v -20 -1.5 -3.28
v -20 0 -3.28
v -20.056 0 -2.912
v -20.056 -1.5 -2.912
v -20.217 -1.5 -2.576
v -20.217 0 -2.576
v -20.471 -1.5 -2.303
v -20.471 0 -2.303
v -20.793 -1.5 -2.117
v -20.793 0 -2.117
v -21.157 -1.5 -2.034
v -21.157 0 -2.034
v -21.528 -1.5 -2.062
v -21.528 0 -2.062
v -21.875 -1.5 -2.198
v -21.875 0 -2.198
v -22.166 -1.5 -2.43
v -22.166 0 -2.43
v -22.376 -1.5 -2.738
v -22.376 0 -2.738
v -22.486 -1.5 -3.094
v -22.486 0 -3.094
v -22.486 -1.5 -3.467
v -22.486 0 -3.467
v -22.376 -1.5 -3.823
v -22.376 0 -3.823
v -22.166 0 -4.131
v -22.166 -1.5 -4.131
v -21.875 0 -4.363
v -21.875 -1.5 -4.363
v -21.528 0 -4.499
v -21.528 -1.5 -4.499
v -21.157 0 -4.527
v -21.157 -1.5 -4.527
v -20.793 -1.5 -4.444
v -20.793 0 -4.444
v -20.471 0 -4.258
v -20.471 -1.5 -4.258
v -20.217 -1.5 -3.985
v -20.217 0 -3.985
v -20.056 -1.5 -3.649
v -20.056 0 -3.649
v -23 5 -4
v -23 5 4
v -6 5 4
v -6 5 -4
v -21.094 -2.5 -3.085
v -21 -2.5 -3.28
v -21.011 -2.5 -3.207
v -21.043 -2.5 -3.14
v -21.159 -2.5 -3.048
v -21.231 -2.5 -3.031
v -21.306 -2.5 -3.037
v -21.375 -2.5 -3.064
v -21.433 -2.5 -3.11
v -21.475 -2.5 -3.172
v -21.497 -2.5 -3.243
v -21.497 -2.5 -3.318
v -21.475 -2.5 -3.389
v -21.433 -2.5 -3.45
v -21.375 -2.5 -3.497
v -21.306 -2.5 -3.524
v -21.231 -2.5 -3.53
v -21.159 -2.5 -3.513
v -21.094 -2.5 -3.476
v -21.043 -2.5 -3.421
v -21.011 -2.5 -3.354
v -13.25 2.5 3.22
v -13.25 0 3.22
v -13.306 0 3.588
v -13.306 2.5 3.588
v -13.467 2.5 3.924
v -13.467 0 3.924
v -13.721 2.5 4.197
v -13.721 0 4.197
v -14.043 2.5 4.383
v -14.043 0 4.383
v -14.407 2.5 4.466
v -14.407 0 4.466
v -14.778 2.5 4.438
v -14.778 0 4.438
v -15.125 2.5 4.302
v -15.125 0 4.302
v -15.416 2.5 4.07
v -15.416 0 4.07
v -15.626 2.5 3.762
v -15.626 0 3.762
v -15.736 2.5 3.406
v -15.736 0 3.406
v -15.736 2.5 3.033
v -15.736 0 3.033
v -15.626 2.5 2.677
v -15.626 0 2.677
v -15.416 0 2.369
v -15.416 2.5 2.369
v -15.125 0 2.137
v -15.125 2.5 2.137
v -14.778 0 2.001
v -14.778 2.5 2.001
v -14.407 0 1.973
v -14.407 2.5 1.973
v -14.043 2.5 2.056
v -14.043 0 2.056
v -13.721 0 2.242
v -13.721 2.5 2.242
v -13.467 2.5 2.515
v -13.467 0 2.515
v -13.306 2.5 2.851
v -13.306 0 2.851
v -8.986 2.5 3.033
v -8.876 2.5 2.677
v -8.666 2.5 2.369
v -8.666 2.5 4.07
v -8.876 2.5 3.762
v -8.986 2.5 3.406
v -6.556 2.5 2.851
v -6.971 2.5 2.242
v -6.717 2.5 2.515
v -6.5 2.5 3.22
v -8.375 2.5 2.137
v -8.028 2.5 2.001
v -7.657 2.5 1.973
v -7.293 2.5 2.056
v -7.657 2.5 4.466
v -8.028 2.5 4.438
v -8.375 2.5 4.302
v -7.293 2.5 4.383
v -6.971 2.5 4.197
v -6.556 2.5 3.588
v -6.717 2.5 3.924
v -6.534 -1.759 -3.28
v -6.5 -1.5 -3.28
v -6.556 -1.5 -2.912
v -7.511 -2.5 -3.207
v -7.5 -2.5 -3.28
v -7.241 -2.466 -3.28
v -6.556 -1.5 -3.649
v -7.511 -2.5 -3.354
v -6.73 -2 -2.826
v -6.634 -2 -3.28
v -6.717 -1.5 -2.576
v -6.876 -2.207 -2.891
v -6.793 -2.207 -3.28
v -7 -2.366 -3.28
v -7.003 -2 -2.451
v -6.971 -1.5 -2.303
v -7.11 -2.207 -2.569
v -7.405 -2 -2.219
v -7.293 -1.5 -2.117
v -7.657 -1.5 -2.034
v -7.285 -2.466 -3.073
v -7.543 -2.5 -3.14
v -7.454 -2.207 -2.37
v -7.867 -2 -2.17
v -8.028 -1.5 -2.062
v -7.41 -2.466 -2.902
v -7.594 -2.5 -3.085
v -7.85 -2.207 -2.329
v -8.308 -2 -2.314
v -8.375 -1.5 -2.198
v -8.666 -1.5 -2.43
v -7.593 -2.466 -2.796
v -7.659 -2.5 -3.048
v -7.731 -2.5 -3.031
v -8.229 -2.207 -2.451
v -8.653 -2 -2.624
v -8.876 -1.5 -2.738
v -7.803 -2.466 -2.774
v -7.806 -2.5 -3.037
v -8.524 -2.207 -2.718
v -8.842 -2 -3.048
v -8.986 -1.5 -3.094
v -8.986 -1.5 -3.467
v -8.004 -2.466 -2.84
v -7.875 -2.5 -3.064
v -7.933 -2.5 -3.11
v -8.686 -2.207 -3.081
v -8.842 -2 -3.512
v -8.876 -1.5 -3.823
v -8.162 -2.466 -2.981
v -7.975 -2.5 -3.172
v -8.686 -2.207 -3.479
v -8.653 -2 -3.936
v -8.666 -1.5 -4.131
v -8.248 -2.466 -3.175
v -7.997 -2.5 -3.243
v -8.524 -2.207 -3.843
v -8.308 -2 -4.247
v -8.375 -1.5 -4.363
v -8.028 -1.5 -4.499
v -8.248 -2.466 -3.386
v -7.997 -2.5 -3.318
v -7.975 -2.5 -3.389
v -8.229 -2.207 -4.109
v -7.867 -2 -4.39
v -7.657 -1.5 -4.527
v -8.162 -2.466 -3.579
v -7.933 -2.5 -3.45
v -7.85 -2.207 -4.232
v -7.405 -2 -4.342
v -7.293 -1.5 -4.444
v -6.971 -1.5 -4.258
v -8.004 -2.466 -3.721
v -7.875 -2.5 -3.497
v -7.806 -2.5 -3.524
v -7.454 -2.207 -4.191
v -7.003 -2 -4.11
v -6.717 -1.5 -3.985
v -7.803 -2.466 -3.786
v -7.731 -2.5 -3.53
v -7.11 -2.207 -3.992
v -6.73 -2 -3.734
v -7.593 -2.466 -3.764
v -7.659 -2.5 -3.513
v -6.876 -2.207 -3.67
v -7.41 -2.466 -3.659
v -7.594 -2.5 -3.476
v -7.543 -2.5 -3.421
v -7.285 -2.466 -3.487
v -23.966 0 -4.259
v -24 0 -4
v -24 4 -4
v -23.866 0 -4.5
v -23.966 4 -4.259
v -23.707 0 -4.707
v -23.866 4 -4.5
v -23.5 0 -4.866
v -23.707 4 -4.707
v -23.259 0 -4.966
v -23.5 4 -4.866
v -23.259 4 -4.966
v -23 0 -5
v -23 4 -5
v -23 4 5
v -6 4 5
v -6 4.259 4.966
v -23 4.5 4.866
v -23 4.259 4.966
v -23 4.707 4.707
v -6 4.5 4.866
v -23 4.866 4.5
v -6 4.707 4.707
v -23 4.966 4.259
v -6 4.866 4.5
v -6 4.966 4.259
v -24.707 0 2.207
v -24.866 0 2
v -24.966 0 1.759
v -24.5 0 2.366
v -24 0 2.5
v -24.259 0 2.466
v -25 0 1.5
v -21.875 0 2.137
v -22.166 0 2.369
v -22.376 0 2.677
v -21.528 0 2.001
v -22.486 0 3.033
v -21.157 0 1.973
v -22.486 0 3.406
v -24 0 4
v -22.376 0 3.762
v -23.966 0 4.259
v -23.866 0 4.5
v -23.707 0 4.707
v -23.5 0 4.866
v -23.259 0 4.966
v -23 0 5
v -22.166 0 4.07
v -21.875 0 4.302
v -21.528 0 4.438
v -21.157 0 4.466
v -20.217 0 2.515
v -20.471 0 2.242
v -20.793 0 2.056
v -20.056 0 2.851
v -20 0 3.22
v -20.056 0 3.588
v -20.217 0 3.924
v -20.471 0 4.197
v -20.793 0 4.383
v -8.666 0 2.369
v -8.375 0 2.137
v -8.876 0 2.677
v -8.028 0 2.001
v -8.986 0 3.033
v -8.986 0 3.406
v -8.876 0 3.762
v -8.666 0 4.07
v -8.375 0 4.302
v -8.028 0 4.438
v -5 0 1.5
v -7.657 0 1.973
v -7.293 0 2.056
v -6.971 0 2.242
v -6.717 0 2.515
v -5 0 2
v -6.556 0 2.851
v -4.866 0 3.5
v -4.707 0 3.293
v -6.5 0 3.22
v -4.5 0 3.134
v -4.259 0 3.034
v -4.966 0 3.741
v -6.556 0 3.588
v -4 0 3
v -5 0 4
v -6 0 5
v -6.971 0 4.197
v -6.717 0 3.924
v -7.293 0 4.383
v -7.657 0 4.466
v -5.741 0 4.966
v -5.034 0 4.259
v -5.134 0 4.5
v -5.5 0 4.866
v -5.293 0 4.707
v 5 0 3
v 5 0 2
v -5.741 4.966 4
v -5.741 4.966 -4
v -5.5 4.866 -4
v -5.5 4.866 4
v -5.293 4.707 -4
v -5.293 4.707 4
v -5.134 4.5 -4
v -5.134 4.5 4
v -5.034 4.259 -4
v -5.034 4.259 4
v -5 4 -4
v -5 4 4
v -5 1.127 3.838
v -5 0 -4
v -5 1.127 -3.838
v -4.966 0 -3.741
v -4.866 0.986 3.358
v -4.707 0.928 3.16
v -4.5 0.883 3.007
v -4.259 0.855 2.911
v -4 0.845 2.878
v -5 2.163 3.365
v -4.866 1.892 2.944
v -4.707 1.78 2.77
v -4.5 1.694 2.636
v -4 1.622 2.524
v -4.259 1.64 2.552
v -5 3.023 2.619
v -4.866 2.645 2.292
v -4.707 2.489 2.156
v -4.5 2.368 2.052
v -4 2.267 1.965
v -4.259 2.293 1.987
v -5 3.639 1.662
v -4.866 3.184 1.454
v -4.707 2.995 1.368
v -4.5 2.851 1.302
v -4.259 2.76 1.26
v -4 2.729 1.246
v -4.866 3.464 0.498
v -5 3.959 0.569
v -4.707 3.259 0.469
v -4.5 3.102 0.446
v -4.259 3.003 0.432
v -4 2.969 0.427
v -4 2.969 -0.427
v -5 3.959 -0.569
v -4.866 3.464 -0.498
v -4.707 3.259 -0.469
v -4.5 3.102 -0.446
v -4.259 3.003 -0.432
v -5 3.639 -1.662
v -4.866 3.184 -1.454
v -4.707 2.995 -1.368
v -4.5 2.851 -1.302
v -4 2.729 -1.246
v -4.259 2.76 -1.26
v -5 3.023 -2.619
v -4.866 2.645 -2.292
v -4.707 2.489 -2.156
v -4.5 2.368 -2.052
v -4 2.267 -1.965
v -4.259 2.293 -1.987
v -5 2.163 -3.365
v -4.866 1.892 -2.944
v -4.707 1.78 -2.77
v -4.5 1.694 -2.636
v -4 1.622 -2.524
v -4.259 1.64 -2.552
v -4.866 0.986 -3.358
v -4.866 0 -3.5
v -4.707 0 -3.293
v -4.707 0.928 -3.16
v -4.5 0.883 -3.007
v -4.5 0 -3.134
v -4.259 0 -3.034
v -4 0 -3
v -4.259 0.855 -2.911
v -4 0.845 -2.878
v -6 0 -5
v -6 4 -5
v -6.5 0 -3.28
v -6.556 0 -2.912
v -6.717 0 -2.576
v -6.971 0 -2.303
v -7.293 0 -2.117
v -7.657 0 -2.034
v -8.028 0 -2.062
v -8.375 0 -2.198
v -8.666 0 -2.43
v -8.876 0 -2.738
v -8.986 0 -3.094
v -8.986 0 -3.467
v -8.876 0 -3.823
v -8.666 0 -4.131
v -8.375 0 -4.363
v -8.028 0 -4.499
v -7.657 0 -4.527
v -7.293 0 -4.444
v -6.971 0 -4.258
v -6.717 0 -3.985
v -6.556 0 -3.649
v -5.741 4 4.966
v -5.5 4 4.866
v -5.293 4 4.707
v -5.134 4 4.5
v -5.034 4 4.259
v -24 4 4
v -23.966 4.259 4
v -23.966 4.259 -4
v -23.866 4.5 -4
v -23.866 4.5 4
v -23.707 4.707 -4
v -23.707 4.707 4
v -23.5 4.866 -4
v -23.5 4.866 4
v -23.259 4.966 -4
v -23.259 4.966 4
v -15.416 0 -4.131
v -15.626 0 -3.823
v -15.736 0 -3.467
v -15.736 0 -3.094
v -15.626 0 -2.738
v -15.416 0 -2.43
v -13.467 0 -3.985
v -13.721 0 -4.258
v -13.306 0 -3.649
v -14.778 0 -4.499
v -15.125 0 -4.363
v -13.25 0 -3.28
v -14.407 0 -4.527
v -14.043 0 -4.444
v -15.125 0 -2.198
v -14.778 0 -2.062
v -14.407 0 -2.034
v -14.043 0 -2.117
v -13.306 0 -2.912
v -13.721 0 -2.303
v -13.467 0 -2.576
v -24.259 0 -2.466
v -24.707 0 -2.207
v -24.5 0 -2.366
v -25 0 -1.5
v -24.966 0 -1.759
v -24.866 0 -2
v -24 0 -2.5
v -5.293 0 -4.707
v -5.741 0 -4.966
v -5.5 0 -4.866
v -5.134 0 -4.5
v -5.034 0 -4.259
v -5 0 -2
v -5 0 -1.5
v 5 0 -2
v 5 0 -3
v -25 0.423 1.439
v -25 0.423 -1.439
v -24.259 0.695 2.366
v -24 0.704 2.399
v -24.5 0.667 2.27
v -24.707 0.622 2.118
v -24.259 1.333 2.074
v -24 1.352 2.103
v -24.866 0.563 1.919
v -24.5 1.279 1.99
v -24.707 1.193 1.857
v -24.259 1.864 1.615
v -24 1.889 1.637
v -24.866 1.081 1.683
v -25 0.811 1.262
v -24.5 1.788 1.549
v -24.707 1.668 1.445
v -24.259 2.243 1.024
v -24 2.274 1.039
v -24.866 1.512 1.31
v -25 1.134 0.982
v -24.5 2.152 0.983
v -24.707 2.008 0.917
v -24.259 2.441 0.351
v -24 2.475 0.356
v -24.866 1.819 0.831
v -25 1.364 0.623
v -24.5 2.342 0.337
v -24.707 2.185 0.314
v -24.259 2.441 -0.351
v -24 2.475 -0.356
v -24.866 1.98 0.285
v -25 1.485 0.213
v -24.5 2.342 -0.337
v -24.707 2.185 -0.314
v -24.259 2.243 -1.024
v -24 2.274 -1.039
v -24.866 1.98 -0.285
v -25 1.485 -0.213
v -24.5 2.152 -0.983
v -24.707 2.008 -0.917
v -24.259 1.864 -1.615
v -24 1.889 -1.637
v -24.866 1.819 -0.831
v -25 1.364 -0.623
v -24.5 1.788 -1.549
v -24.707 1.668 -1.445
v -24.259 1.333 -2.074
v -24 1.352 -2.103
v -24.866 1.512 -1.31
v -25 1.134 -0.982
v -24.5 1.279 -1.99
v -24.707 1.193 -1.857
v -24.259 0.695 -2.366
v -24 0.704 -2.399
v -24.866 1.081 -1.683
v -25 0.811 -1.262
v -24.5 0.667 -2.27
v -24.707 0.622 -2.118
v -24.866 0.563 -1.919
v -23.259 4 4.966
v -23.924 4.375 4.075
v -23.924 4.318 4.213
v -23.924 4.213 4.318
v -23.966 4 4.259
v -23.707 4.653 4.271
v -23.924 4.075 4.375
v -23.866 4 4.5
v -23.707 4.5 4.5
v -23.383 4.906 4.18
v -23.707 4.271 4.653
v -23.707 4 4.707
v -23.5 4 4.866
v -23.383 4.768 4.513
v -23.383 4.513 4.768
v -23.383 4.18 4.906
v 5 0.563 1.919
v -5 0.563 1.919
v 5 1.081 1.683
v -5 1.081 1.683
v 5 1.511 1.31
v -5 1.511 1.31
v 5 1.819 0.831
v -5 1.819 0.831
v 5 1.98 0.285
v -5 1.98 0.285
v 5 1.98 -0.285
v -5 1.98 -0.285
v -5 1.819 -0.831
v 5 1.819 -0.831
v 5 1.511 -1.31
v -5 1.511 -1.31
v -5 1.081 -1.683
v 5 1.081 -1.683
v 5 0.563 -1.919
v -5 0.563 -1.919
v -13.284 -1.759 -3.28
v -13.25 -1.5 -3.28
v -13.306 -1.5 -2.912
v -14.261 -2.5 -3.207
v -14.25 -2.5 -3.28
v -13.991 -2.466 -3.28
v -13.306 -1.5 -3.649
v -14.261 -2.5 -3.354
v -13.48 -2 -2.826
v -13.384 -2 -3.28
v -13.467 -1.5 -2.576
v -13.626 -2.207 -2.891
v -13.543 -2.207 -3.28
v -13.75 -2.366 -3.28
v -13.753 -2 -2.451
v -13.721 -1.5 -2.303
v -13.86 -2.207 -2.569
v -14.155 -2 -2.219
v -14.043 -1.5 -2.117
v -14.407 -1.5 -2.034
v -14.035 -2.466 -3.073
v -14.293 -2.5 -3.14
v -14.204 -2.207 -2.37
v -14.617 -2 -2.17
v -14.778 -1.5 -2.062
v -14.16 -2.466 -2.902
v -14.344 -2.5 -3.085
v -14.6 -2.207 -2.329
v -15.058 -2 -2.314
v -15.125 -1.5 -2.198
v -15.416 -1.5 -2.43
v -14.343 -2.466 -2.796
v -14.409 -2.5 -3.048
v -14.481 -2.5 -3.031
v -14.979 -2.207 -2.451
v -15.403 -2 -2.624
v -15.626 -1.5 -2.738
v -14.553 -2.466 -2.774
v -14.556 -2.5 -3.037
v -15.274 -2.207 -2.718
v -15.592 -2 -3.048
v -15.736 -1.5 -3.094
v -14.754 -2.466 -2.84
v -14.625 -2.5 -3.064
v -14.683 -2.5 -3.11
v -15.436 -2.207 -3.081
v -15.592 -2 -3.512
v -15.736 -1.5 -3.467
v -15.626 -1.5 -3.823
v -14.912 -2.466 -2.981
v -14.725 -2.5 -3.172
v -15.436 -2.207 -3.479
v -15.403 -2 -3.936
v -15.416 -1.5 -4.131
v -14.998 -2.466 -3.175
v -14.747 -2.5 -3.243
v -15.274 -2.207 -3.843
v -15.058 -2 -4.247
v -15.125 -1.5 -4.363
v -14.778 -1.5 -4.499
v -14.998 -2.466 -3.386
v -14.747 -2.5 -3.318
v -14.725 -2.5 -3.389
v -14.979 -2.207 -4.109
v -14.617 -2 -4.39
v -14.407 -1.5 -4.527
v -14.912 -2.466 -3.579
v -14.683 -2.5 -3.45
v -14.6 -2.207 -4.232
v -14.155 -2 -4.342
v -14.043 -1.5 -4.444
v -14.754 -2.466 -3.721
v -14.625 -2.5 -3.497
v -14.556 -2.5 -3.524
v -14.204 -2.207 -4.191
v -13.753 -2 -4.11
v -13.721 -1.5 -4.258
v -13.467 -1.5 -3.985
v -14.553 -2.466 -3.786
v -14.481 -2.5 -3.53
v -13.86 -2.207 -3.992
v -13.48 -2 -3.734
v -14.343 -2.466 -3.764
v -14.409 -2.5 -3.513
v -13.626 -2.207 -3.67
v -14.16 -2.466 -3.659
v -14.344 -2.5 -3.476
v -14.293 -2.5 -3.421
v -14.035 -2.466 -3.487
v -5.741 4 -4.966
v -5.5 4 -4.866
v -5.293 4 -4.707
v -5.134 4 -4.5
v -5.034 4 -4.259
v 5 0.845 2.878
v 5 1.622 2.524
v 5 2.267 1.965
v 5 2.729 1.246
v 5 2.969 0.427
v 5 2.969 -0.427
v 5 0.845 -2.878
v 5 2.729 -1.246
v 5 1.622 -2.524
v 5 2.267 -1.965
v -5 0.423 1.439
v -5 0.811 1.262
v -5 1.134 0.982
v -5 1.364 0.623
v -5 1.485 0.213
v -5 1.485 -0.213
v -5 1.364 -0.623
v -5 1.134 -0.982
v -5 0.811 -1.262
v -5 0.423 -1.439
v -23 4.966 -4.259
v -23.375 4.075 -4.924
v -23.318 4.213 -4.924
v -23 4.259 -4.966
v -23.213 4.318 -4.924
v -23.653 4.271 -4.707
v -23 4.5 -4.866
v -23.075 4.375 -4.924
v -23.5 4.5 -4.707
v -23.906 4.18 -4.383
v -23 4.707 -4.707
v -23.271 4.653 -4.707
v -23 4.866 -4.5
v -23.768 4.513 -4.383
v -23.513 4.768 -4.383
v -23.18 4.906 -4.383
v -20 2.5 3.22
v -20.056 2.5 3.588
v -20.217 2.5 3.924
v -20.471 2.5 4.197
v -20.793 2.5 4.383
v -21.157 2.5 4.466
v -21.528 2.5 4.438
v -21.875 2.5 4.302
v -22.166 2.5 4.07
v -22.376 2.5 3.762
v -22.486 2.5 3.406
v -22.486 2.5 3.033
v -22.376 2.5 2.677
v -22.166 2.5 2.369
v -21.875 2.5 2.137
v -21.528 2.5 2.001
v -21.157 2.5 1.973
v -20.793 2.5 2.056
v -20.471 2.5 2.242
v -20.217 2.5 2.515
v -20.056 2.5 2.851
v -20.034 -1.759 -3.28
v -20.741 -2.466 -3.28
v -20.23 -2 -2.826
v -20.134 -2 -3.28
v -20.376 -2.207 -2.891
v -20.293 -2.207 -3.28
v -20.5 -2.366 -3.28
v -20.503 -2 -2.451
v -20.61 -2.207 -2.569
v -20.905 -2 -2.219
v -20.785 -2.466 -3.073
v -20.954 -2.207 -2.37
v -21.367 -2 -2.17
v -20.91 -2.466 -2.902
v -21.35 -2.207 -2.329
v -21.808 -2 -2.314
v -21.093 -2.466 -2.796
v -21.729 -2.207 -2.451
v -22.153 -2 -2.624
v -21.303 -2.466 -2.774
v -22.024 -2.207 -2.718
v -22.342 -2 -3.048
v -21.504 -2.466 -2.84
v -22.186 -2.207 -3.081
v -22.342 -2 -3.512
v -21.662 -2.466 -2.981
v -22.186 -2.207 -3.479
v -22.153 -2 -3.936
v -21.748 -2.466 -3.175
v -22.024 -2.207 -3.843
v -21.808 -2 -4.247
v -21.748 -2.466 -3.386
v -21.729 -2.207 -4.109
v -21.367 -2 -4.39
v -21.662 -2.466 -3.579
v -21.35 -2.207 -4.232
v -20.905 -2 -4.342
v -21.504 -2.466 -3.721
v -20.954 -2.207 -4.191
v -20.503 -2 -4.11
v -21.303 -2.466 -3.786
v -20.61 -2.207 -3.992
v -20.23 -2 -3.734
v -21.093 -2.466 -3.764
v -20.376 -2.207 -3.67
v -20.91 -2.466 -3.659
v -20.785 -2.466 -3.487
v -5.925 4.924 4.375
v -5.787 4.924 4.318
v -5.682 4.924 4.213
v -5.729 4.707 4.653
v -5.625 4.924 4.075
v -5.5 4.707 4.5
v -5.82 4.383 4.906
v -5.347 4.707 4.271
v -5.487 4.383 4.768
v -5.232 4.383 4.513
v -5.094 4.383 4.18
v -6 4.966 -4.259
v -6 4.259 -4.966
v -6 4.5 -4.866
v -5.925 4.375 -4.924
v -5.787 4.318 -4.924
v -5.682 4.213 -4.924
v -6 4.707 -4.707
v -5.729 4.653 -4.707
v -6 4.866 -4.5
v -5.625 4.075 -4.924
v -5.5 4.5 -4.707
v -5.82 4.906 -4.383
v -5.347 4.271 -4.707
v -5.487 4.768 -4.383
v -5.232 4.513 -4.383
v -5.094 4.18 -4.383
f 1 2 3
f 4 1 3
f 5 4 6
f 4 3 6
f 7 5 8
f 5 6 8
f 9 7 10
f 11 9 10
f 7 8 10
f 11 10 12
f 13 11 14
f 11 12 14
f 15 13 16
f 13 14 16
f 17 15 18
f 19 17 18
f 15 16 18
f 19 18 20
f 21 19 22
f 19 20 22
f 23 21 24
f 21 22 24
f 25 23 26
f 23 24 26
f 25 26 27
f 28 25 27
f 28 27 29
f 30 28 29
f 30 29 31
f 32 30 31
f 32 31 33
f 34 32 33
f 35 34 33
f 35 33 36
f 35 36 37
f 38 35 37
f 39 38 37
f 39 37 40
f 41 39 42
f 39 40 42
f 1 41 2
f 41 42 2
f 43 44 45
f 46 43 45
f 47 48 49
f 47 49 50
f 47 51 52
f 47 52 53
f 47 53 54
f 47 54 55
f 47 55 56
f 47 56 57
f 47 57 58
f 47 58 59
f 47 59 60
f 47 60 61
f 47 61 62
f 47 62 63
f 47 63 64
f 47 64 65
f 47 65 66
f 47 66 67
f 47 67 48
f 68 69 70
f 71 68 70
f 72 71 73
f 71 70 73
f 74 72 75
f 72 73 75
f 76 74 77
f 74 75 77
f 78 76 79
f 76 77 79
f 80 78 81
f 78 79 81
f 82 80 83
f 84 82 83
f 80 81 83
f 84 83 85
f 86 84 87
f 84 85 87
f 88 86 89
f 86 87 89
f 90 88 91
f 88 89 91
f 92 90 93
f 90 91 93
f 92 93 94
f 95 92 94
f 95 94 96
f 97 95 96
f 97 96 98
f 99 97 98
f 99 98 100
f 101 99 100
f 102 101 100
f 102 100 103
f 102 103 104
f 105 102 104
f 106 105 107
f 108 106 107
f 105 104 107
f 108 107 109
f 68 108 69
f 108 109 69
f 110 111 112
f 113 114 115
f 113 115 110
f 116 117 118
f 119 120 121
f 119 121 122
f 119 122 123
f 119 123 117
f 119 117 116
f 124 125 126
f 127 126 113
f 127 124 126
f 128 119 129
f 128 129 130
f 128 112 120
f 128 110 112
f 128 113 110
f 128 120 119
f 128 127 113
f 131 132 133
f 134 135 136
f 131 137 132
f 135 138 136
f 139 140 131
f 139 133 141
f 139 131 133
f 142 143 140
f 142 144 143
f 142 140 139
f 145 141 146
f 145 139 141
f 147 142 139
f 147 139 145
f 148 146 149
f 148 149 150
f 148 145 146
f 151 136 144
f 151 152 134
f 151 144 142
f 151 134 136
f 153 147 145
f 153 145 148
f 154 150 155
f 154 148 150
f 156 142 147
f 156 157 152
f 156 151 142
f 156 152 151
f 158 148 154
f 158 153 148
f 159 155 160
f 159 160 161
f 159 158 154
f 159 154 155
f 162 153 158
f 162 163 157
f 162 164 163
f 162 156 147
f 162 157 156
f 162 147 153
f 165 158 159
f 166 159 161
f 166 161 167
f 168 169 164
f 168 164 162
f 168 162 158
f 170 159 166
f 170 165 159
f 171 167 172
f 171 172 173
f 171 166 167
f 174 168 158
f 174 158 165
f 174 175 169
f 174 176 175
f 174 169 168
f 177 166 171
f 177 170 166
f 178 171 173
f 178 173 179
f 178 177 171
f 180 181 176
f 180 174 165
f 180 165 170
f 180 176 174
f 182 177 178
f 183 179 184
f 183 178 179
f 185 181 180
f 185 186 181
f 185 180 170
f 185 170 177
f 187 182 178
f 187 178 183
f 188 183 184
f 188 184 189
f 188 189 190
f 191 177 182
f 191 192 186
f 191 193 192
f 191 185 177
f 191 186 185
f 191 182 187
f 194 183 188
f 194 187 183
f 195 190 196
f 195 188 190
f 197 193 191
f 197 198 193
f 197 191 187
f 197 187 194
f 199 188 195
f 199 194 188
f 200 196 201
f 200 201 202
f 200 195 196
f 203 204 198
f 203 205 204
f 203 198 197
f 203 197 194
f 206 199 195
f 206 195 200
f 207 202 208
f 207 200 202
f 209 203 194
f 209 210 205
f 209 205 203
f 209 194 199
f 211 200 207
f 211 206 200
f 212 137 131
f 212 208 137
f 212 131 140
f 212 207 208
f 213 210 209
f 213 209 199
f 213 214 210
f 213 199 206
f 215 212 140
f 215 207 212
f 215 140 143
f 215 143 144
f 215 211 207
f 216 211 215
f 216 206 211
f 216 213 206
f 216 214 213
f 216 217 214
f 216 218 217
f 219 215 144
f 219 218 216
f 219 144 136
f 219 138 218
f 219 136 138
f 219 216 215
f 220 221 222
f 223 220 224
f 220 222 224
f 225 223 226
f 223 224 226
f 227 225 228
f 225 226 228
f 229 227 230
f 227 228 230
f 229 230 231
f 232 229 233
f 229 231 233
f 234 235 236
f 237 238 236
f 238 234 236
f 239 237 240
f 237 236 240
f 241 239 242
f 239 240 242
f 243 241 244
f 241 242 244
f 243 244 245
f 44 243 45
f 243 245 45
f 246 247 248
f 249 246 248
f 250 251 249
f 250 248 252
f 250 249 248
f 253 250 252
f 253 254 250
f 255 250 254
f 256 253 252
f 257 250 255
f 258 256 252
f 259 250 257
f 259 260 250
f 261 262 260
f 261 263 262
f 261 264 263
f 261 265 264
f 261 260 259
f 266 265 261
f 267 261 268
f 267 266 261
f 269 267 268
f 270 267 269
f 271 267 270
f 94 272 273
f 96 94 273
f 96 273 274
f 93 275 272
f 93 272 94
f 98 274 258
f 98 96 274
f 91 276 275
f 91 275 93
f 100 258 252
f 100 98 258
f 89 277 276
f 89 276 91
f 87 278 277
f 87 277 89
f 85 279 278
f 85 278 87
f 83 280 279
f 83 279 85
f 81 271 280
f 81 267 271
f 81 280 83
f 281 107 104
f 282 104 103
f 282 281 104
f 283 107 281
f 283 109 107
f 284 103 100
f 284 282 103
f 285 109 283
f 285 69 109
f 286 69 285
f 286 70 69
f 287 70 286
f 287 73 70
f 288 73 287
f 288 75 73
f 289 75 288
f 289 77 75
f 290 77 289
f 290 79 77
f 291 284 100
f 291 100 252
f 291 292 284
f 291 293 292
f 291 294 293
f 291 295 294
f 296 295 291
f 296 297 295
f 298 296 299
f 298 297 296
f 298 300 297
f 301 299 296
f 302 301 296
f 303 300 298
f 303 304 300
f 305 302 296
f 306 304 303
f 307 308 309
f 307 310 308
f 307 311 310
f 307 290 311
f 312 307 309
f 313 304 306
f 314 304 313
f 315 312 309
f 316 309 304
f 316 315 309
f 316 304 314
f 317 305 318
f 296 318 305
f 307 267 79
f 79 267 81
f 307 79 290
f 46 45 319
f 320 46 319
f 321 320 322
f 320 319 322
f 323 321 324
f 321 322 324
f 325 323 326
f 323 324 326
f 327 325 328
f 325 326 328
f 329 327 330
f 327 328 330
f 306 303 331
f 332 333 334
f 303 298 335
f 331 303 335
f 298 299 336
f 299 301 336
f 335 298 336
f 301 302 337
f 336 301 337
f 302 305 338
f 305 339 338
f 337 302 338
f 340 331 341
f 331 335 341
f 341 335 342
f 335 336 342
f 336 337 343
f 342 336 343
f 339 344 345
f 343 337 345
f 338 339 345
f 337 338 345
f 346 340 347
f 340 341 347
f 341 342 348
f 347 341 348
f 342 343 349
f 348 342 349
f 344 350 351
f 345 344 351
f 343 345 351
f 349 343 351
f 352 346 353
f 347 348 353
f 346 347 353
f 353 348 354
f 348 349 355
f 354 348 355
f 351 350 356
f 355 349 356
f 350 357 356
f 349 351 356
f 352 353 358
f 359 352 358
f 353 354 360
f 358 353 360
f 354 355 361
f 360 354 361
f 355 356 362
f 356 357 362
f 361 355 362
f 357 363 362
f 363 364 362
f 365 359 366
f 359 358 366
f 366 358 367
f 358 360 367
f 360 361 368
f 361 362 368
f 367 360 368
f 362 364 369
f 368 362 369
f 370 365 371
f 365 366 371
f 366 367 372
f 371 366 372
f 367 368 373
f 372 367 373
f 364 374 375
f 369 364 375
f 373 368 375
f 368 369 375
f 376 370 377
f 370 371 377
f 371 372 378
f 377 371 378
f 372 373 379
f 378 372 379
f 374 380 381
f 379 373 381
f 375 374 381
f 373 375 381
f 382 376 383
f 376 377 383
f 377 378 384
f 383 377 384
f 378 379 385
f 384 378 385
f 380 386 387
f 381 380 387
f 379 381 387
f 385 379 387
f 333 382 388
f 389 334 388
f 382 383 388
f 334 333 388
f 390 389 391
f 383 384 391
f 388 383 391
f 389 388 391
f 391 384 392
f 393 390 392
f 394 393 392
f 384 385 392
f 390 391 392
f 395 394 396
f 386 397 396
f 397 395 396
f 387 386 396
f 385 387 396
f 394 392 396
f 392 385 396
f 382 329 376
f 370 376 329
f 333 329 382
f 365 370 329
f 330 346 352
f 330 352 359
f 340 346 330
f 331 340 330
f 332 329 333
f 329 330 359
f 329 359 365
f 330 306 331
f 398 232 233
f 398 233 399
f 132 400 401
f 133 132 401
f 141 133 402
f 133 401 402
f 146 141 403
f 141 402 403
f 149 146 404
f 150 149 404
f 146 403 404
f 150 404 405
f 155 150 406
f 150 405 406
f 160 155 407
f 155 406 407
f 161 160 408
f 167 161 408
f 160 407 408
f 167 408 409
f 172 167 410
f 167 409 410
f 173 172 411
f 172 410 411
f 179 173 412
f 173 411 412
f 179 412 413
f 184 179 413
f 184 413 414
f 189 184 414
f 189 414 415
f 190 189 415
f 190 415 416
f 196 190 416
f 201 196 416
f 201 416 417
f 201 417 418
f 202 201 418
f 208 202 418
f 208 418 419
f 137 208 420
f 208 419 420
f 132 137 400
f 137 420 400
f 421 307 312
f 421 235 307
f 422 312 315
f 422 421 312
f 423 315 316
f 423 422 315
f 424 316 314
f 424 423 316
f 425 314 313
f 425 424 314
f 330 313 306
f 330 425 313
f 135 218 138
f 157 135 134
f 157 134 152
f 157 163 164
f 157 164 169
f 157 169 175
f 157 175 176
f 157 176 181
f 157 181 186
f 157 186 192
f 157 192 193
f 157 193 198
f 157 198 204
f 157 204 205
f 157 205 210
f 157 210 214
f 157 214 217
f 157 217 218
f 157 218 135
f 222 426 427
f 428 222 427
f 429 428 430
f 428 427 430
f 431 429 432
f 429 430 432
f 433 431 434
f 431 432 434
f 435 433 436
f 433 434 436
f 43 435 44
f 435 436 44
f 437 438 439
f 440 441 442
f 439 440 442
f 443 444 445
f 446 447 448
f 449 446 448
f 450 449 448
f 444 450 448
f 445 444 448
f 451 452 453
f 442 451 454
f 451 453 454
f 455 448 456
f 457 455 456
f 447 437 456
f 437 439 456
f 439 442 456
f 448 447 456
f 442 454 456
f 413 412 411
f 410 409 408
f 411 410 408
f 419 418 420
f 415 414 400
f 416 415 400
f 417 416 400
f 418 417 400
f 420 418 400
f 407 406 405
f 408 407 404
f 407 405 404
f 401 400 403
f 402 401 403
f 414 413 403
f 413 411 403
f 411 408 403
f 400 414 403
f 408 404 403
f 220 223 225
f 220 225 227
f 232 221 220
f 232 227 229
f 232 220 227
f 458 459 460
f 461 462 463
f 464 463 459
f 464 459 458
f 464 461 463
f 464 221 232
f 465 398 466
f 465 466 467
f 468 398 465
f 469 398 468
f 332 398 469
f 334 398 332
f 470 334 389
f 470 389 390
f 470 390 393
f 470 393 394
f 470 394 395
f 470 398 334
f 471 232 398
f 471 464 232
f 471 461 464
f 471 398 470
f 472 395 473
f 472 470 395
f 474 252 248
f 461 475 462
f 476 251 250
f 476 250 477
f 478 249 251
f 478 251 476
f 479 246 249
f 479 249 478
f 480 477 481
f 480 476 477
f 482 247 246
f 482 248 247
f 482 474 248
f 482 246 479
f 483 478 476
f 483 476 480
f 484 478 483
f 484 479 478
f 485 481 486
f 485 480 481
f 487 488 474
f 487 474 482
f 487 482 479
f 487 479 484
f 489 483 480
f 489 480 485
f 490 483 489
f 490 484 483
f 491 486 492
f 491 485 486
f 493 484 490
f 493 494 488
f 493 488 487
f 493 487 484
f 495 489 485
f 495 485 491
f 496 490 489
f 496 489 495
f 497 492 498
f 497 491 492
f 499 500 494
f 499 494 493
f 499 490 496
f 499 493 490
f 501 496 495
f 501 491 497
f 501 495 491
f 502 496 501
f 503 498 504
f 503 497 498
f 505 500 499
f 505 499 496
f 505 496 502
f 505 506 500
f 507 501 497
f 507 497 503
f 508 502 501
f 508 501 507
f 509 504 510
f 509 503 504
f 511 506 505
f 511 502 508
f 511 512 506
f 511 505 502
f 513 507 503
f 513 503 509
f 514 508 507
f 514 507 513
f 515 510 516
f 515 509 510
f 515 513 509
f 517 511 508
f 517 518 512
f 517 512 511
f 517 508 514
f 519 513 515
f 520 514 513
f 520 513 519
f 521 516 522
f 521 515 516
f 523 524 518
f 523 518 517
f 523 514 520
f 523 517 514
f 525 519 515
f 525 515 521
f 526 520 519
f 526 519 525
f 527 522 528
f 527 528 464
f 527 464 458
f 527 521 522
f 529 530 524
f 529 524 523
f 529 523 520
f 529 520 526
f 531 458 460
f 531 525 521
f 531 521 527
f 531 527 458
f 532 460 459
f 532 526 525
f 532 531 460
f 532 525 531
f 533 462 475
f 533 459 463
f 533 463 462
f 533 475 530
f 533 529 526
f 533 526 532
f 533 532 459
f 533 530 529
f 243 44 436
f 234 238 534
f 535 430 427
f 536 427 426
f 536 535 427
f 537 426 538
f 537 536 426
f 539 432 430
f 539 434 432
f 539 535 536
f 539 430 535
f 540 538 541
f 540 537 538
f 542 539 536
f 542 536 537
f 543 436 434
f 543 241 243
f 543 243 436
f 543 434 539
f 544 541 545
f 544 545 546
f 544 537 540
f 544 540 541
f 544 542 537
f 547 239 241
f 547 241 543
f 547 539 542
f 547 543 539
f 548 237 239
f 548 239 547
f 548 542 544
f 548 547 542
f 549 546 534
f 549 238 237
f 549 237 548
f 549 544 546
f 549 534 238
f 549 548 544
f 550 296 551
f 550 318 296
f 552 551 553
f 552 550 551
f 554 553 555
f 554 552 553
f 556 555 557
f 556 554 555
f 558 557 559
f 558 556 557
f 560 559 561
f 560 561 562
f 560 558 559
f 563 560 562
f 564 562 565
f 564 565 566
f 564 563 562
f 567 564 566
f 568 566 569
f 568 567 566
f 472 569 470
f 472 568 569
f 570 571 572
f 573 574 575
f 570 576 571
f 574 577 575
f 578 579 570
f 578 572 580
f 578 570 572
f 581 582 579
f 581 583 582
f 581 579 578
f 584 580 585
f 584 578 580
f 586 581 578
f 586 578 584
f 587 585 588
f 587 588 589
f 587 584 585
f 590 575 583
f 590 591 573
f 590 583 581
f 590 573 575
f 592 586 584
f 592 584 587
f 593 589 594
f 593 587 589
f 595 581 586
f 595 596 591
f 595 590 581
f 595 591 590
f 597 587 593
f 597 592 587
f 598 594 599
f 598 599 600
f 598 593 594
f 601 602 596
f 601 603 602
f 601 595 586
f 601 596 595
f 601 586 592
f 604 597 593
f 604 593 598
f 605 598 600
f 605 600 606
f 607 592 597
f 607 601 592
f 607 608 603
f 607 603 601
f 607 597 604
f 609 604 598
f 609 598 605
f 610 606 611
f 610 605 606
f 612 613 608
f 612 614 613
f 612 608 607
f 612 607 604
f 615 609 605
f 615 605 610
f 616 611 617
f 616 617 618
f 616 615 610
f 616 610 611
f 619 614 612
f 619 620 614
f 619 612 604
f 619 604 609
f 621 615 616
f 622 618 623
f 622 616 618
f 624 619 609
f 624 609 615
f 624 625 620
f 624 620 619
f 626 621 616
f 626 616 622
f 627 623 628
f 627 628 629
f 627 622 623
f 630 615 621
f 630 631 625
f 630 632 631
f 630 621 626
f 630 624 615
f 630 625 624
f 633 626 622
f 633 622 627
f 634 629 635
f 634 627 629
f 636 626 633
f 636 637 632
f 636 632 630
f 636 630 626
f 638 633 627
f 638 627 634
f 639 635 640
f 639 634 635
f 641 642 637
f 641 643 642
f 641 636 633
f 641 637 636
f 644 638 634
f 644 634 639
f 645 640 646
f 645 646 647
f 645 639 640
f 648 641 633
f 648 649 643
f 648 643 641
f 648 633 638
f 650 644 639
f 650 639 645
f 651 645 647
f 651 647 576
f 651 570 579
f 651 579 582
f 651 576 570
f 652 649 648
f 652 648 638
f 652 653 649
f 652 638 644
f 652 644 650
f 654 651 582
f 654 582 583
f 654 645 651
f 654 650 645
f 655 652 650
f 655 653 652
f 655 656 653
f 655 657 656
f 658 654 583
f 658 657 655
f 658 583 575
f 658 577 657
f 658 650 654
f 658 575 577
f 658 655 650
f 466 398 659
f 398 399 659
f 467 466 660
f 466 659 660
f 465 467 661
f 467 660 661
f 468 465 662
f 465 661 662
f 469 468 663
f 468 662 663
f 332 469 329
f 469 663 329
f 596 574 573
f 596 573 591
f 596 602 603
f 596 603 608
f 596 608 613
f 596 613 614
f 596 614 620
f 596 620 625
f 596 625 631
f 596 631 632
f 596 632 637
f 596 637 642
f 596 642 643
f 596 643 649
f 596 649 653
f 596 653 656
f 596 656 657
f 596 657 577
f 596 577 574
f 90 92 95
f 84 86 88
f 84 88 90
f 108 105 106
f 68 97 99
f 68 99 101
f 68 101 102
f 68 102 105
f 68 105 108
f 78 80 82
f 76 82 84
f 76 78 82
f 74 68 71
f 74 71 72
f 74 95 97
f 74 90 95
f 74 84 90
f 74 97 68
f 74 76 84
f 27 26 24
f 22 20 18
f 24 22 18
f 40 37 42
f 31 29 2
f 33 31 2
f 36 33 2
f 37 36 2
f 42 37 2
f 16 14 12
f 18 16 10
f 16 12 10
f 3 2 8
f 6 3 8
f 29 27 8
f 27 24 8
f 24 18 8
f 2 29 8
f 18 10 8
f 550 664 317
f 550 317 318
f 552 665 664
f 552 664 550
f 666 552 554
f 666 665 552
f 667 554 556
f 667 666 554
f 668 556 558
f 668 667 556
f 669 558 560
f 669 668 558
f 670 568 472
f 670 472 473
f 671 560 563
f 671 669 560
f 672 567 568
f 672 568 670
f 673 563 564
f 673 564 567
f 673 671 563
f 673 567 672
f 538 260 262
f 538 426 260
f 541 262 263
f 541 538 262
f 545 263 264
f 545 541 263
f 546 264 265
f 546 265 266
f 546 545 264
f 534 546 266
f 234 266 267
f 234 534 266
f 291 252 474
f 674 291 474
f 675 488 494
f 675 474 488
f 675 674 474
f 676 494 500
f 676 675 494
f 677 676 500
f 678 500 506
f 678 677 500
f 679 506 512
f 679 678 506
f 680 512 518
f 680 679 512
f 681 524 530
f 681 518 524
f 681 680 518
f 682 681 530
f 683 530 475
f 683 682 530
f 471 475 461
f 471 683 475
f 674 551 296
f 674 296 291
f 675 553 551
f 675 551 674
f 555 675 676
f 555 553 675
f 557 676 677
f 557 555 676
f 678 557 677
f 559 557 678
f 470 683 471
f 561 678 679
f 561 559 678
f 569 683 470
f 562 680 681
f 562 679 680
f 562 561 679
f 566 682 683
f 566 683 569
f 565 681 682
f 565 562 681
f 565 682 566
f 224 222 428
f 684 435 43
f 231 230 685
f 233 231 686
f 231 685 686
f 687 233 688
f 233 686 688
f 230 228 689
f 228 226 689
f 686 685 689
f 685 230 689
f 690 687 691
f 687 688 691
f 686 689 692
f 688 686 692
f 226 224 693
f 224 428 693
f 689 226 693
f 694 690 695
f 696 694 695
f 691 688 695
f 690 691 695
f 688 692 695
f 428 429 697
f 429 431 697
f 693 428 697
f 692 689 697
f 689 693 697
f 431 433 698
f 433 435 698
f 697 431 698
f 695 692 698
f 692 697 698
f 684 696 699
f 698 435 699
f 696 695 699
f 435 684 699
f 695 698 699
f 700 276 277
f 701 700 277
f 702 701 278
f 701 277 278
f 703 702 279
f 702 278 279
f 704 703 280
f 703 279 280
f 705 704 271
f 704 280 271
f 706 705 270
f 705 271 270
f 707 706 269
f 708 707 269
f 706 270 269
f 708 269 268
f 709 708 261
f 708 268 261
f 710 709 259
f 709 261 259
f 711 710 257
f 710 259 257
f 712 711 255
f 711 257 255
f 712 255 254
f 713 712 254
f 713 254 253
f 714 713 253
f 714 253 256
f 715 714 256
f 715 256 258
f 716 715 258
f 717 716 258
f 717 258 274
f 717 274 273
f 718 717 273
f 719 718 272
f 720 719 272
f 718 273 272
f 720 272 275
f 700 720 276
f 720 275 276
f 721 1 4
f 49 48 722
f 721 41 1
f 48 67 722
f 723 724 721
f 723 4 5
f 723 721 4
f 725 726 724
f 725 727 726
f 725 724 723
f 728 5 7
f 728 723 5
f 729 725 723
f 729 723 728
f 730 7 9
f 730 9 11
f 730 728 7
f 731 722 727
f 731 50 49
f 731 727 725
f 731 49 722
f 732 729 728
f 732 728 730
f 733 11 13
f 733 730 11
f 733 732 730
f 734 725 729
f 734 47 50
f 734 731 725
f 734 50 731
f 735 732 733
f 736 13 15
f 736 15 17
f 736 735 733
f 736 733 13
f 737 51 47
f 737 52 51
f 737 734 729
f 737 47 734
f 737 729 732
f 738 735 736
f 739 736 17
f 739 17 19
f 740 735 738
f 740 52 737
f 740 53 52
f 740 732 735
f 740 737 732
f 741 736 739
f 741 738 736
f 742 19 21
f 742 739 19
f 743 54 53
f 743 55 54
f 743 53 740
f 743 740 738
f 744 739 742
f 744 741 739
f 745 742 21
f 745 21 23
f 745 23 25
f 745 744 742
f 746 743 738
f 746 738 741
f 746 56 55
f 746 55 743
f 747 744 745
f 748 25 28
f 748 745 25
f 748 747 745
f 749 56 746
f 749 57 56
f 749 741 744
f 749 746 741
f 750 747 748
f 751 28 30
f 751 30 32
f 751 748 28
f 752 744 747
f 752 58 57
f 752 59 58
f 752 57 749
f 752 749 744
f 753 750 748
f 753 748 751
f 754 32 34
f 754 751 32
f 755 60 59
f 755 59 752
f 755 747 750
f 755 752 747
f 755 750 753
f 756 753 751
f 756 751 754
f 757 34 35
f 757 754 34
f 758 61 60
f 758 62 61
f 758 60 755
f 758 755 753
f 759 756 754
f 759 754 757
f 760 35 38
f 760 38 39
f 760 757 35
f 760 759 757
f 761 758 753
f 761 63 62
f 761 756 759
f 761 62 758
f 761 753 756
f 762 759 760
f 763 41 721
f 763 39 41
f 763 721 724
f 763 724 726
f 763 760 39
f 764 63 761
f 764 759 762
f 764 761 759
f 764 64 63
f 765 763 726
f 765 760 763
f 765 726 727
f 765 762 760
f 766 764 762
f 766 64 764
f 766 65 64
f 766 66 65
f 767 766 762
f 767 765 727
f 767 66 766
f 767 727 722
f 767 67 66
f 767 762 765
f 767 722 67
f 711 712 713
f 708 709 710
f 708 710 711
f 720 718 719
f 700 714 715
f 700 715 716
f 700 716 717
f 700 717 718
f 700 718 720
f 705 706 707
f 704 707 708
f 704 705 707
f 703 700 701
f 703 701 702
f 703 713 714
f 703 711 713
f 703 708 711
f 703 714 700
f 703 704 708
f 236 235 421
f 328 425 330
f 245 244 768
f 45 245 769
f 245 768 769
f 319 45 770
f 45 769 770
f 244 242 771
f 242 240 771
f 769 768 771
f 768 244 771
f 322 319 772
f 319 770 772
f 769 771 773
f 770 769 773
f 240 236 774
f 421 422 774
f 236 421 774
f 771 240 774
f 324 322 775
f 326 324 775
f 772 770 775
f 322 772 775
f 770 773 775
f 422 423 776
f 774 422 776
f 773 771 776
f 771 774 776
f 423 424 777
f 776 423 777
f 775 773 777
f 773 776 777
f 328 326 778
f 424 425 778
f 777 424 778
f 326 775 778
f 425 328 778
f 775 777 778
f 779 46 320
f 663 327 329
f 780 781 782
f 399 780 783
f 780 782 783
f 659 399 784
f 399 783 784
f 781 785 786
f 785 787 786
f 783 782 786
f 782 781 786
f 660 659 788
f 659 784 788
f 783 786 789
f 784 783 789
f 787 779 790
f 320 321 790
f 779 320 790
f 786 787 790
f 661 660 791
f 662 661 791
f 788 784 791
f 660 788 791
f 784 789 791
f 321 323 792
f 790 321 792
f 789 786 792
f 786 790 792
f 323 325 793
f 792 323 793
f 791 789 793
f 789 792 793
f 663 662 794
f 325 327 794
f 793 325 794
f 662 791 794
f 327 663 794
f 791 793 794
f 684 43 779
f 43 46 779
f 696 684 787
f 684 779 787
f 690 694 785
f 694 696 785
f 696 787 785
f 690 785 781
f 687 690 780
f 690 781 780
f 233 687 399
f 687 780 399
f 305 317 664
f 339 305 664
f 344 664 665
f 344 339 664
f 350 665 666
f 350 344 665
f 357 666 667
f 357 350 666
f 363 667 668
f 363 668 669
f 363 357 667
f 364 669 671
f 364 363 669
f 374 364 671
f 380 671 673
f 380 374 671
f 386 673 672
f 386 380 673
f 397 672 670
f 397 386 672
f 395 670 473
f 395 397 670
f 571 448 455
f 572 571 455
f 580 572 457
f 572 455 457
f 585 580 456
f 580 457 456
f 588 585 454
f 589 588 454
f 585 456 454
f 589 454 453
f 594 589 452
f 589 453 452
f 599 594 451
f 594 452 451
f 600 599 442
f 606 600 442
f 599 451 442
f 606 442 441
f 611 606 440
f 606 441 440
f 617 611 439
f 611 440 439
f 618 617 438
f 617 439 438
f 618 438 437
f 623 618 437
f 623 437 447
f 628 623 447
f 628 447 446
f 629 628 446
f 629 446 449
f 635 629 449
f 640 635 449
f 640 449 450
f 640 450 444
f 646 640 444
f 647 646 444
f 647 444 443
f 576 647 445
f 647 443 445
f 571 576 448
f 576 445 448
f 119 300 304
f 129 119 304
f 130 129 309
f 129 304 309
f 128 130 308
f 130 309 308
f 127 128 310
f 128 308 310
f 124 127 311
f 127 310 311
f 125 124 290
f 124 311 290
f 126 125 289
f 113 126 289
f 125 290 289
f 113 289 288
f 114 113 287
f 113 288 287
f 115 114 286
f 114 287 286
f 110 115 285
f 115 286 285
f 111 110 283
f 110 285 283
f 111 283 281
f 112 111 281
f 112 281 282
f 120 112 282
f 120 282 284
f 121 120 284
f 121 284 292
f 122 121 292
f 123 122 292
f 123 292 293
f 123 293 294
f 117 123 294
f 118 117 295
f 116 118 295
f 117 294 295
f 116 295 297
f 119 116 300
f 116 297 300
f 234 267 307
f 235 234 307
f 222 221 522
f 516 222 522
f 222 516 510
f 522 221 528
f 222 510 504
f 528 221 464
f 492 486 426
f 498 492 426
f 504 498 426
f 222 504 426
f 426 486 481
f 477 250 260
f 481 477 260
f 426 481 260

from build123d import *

# Parameters (mm, degrees)
F1_ANGLE = 180
F2_W     = 19
F2_H     = 10
F3_DEPTH = 5
F4_R     = 1.5
F5_DEPTH = 25
F6_R     = 1.25
F7_DEPTH = 2.5
F8_DEPTH = 2.5
F9_R     = 0.99999
F10_R    = 0.99999
F11_R    = 1
F11_2_R  = 1
F11_3_R  = 1


# Not quite as in the source:
# - a fillet or chamfer is up to 0.001 mm smaller than in the source, because OpenCascade refuses the exact size


with BuildPart() as f1:
    # F0 (on Front) → F1 (revolve)
    with BuildSketch(Plane.XZ):
        Polygon((-5, 2), (5, 2), (5, 3), (-5.9999994636, 3), (-6, 2.5), (-25, 2.5), (-25, 1.5), (-5, 1.5), align=None)
    revolve(axis=Axis((-10, 0, 0), (-1, 0, 0)), revolution_arc=F1_ANGLE)

    # F2 (on Front) → F3 (join)
    with BuildSketch(Plane.XZ):
        with Locations((-14.5, 0)):
            Rectangle(F2_W, F2_H)
    extrude(amount=-F3_DEPTH)

    # F4 (on Right) → F5 (cut)
    with BuildSketch(Plane.YZ):
        Circle(F4_R)
    extrude(amount=-F5_DEPTH, mode=Mode.SUBTRACT)

    # F6 (on Front) → F7 (cut)
    with BuildSketch(Plane.XZ):
        with Locations((-21.25, 3.2196251888)):
            Circle(F6_R)
        with Locations((-14.5, 3.2196251888)):
            Circle(F6_R)
        with Locations((-7.75, 3.2196251888)):
            Circle(F6_R)
    extrude(amount=-F7_DEPTH, mode=Mode.SUBTRACT)

    # F9 (radius 1 in the source; OpenCascade refuses exactly that, so slightly less here)
    f9_edges = [f1.edges().sort_by_distance(p)[0] for p in [
        (-5, 2.5, 5),
        (-14.5, 5, 5),
        (-5, 5, 0),
        (-24, 5, 0),
        (-24, 2.5, 5),
        (-24, 2.5, -5),
        (-14.5, 5, -5),
        (-5, 2.5, -5),
        (-5, 3, 0),
    ]]
    fillet(f9_edges, radius=F9_R)

    # F10 (radius 1 in the source; OpenCascade refuses exactly that, so slightly less here)
    f10_edges = [f1.edges().sort_by_distance(p)[0] for p in [
        (-25, 2.5, 0),
    ]]
    fillet(f10_edges, radius=F10_R)


with BuildPart() as f8:
    # F6 (on Front) → F8 (new body)
    with BuildSketch(Plane.XZ):
        with Locations((-21.25, -3.2803748112)):
            Circle(F6_R)
    extrude(amount=F8_DEPTH)

    # F11
    f11_edges = [f8.edges().sort_by_distance(p)[0] for p in [
        (-22.5, -2.5, -3.280375),
    ]]
    fillet(f11_edges, radius=F11_R)


with BuildPart() as f8b:
    # F6 (on Front) → F8, piece 2 (new body)
    with BuildSketch(Plane.XZ):
        with Locations((-14.5, -3.2803748112)):
            Circle(F6_R)
    extrude(amount=F8_DEPTH)

    # F11#2
    f11_2_edges = [f8b.edges().sort_by_distance(p)[0] for p in [
        (-15.75, -2.5, -3.280375),
    ]]
    fillet(f11_2_edges, radius=F11_2_R)


with BuildPart() as f8c:
    # F6 (on Front) → F8, piece 3 (new body)
    with BuildSketch(Plane.XZ):
        with Locations((-7.75, -3.2803748112)):
            Circle(F6_R)
    extrude(amount=F8_DEPTH)

    # F11#3
    f11_3_edges = [f8c.edges().sort_by_distance(p)[0] for p in [
        (-9, -2.5, -3.280375),
    ]]
    fillet(f11_3_edges, radius=F11_3_R)


solid = Compound([f1.part, f8.part, f8b.part, f8c.part])
